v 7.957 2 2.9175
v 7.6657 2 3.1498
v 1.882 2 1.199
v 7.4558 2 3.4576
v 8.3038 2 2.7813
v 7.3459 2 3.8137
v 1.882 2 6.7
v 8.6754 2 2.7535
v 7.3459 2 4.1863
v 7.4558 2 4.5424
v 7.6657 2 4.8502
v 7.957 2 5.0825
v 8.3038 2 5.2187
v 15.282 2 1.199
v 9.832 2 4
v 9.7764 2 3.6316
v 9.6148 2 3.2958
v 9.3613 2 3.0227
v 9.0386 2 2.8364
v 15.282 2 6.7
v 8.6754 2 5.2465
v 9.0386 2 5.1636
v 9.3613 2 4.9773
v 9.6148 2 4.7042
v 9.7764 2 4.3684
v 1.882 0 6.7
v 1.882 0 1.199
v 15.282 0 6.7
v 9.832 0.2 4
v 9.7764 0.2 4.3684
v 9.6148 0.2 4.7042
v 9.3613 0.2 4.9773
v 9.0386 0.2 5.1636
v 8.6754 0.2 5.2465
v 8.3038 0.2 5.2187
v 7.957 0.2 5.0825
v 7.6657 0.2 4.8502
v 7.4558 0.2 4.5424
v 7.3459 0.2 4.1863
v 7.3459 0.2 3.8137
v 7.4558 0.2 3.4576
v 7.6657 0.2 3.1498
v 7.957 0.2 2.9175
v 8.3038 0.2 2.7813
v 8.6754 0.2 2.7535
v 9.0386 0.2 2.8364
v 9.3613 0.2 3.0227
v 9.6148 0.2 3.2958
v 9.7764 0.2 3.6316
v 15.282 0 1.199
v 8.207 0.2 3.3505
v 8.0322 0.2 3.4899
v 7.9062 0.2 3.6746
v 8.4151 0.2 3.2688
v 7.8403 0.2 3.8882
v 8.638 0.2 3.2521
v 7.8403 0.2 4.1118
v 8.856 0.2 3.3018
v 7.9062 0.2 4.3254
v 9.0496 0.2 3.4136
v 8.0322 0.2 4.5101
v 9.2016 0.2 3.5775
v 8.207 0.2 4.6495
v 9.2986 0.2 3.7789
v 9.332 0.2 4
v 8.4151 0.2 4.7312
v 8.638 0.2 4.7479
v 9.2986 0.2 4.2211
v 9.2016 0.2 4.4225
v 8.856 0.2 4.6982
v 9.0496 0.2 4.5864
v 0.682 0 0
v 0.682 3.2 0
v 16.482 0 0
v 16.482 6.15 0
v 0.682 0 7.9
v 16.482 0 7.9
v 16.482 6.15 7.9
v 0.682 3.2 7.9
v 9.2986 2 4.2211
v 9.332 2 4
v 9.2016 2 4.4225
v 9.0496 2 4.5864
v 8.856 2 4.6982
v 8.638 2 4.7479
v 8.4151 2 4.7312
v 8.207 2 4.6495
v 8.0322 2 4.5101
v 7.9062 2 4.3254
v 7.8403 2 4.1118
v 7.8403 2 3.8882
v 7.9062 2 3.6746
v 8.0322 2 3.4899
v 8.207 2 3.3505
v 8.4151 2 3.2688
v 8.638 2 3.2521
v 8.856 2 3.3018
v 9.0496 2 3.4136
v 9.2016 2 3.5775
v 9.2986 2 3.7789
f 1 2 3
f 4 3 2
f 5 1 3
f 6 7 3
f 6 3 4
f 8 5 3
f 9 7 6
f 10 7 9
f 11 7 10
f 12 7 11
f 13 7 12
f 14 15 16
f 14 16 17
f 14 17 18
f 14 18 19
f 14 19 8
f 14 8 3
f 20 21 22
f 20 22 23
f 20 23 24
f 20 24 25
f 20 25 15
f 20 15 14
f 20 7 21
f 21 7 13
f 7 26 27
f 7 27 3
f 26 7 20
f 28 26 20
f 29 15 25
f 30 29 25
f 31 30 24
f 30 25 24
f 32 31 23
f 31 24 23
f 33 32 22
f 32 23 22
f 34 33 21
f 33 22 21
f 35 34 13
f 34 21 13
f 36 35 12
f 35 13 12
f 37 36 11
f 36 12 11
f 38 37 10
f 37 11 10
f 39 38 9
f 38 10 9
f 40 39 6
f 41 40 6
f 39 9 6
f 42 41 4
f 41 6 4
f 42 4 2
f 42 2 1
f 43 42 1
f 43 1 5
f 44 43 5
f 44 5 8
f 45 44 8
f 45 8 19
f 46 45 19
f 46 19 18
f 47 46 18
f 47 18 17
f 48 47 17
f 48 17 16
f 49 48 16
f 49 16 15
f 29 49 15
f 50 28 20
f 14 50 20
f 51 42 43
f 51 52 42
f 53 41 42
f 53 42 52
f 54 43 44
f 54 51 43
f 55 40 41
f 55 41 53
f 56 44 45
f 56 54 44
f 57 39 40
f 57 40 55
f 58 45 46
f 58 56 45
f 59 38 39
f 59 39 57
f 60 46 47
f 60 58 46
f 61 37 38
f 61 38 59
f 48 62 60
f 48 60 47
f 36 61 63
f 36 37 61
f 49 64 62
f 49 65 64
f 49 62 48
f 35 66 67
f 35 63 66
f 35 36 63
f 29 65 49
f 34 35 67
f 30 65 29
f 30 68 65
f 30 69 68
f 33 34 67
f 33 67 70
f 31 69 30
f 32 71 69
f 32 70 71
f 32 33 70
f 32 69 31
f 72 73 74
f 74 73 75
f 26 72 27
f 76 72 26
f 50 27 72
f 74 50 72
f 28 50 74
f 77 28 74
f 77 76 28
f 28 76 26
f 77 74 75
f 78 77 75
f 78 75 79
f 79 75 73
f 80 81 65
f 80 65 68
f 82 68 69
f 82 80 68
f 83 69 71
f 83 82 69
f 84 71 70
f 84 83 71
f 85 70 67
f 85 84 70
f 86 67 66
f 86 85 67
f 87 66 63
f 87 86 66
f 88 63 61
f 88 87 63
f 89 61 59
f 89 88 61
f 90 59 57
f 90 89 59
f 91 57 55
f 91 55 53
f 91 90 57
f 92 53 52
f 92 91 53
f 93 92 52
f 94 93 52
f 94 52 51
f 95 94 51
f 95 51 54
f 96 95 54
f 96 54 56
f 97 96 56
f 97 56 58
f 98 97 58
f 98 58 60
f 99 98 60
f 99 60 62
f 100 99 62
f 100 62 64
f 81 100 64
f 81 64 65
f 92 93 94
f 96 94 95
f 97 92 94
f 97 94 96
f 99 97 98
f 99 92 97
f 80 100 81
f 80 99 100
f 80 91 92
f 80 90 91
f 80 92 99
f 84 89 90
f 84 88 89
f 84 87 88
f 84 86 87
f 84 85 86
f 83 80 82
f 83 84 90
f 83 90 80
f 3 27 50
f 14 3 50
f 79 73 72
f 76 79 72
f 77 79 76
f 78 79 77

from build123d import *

# Parameters (mm, degrees)
MAINBASESKETCH_W          = 15.8
MAINBASESKETCH_H          = 3.2
MAINBASEEXTRUDE_DEPTH     = 7.9
STUDSSKETCH_R             = 2.4
STUDSEXTRUDE_DEPTH        = 1.6
MAINBASESHELL_T           = -1.2
LCUTBLUE_DEPTH            = 19.555463972
LCUTBLUE_DEPTH_BACK       = 19.555463972
CUTADDEDTOLCUT_DEPTH      = 2
MADESLIMCUTSKETCH_W       = 7.9
MADESLIMCUTSKETCH_H       = 7.9
MADESLIMCUT_DEPTH         = 19.897228453
MADESLIMFILLEXT_REACH     = 20.555
SKETCH33_W                = 5.500952983
SKETCH33_H                = 1.199047018
SLIMHOLEEXT_START         = -0.2
SLIMHOLESKETCH_R          = 1.25
SLIMHOLESKETCH_R_2        = 0.75
SLIMHOLEEXT_DEPTH         = 2
ANGLEDSLIMBASECUT_DEPTH   = 19.555463972
ANGLEDSLIMBASESWEEP_DEPTH = 7.9


# Read off the part's stored shape, not the designer's step: AngledSlimBaseSweep
with BuildPart() as part:
    # MainBaseSketch → MainBaseExtrude (new, symmetric)
    with BuildSketch(Plane.XY):
        with Locations((8.581967213, 1.6)):
            Rectangle(MAINBASESKETCH_W, MAINBASESKETCH_H)
    extrude(amount=MAINBASEEXTRUDE_DEPTH, both=True)

    # StudsSketch → StudsExtrude (add)
    with BuildSketch(Plane(origin=(0, 3.2, 0), x_dir=(1, 0, 0), z_dir=(0, 1, 0))):
        with Locations((4.581967213, 4)):
            Circle(STUDSSKETCH_R)
    extrude(amount=STUDSEXTRUDE_DEPTH)

    # MainBaseShell
    mainbaseshell_openings = [part.faces().sort_by_distance(p)[0] for p in [
        (8.581967213, 0, 0),
    ]]
    offset(amount=MAINBASESHELL_T, openings=mainbaseshell_openings, kind=Kind.INTERSECTION)

    # LCUTBlueSketch → LCutBlue (cut, two sides: drawn at the far end of the back side and taken through both)
    with BuildSketch(Plane(origin=(0, 3.2, 0), x_dir=(1, 0, 0), z_dir=(0, 1, 0)).offset(-LCUTBLUE_DEPTH_BACK)):
        Polygon((8.581967213, 53.229874044), (8.581967213, 7.9), (8.581967213, 0), (16.481967213, 0), (61.811841258, 0), (125.917963912, 64.106122654), (72.688089868, 117.335996699), align=None)
    extrude(amount=LCUTBLUE_DEPTH + LCUTBLUE_DEPTH_BACK, mode=Mode.SUBTRACT)

    # CutAddedtoLSketch → CutAddedToLCut (add)
    with BuildSketch(Plane.XZ):
        Polygon((7.382920196, -6.7), (8.581967213, -6.7), (8.581967213, 0), (15.281967213, 0), (15.281967213, 1.199047018), (7.382920196, 1.199047018), (7.382920196, 0), align=None)
    extrude(amount=-CUTADDEDTOLCUT_DEPTH)

    # MadeSlimCutSketch → MadeSlimCut (cut, through all)
    with BuildSketch(Plane.XZ):
        with Locations((4.631967213, -3.95)):
            Rectangle(MADESLIMCUTSKETCH_W, MADESLIMCUTSKETCH_H)
    extrude(amount=-MADESLIMCUT_DEPTH, mode=Mode.SUBTRACT)

    # Sketch33 → MadeSlimFillExt (add, up to next)
    with BuildSketch(Plane.XZ, mode=Mode.PRIVATE) as madeslimfillext_sk1:
        with Locations((4.632443704, 0.599523509)):
            Rectangle(SKETCH33_W, SKETCH33_H)
    madeslimfillext_tool1 = extrude(madeslimfillext_sk1.sketch, amount=-MADESLIMFILLEXT_REACH, mode=Mode.PRIVATE) - part.part
    add(madeslimfillext_tool1.solids().sort_by_distance((4.632444, 0, 0.599524))[0])

    # SlimHoleSketch → SlimHoleExt (add)
    with BuildSketch(Plane.XZ.offset(-2).offset(SLIMHOLEEXT_START)):
        with Locations((8.581967213, 4)):
            Circle(SLIMHOLESKETCH_R)
        with Locations((8.581967213, 4)):
            Circle(SLIMHOLESKETCH_R_2, mode=Mode.SUBTRACT)
    extrude(amount=SLIMHOLEEXT_DEPTH)

    # AngledSlimBaseSketch → AngledSlimBaseCut (cut, through all)
    with BuildSketch(Plane.XY.offset(7.9)):
        Polygon((0.681967213, 2.247699421), (16.481967213, 2.247699421), (16.481967213, 6.15), (0.681967213, 3.2), align=None)
    extrude(amount=-ANGLEDSLIMBASECUT_DEPTH, mode=Mode.SUBTRACT)

    # AngledSlimBaseSweep outline → AngledSlimBaseSweep (add)
    with BuildSketch(Plane.XY):
        Polygon((16.481967213, 2.247699421), (16.481967213, 6.15), (0.681967213, 3.2), (0.681967213, 2.247699421), align=None)
    extrude(amount=ANGLEDSLIMBASESWEEP_DEPTH)


solid = part.part
